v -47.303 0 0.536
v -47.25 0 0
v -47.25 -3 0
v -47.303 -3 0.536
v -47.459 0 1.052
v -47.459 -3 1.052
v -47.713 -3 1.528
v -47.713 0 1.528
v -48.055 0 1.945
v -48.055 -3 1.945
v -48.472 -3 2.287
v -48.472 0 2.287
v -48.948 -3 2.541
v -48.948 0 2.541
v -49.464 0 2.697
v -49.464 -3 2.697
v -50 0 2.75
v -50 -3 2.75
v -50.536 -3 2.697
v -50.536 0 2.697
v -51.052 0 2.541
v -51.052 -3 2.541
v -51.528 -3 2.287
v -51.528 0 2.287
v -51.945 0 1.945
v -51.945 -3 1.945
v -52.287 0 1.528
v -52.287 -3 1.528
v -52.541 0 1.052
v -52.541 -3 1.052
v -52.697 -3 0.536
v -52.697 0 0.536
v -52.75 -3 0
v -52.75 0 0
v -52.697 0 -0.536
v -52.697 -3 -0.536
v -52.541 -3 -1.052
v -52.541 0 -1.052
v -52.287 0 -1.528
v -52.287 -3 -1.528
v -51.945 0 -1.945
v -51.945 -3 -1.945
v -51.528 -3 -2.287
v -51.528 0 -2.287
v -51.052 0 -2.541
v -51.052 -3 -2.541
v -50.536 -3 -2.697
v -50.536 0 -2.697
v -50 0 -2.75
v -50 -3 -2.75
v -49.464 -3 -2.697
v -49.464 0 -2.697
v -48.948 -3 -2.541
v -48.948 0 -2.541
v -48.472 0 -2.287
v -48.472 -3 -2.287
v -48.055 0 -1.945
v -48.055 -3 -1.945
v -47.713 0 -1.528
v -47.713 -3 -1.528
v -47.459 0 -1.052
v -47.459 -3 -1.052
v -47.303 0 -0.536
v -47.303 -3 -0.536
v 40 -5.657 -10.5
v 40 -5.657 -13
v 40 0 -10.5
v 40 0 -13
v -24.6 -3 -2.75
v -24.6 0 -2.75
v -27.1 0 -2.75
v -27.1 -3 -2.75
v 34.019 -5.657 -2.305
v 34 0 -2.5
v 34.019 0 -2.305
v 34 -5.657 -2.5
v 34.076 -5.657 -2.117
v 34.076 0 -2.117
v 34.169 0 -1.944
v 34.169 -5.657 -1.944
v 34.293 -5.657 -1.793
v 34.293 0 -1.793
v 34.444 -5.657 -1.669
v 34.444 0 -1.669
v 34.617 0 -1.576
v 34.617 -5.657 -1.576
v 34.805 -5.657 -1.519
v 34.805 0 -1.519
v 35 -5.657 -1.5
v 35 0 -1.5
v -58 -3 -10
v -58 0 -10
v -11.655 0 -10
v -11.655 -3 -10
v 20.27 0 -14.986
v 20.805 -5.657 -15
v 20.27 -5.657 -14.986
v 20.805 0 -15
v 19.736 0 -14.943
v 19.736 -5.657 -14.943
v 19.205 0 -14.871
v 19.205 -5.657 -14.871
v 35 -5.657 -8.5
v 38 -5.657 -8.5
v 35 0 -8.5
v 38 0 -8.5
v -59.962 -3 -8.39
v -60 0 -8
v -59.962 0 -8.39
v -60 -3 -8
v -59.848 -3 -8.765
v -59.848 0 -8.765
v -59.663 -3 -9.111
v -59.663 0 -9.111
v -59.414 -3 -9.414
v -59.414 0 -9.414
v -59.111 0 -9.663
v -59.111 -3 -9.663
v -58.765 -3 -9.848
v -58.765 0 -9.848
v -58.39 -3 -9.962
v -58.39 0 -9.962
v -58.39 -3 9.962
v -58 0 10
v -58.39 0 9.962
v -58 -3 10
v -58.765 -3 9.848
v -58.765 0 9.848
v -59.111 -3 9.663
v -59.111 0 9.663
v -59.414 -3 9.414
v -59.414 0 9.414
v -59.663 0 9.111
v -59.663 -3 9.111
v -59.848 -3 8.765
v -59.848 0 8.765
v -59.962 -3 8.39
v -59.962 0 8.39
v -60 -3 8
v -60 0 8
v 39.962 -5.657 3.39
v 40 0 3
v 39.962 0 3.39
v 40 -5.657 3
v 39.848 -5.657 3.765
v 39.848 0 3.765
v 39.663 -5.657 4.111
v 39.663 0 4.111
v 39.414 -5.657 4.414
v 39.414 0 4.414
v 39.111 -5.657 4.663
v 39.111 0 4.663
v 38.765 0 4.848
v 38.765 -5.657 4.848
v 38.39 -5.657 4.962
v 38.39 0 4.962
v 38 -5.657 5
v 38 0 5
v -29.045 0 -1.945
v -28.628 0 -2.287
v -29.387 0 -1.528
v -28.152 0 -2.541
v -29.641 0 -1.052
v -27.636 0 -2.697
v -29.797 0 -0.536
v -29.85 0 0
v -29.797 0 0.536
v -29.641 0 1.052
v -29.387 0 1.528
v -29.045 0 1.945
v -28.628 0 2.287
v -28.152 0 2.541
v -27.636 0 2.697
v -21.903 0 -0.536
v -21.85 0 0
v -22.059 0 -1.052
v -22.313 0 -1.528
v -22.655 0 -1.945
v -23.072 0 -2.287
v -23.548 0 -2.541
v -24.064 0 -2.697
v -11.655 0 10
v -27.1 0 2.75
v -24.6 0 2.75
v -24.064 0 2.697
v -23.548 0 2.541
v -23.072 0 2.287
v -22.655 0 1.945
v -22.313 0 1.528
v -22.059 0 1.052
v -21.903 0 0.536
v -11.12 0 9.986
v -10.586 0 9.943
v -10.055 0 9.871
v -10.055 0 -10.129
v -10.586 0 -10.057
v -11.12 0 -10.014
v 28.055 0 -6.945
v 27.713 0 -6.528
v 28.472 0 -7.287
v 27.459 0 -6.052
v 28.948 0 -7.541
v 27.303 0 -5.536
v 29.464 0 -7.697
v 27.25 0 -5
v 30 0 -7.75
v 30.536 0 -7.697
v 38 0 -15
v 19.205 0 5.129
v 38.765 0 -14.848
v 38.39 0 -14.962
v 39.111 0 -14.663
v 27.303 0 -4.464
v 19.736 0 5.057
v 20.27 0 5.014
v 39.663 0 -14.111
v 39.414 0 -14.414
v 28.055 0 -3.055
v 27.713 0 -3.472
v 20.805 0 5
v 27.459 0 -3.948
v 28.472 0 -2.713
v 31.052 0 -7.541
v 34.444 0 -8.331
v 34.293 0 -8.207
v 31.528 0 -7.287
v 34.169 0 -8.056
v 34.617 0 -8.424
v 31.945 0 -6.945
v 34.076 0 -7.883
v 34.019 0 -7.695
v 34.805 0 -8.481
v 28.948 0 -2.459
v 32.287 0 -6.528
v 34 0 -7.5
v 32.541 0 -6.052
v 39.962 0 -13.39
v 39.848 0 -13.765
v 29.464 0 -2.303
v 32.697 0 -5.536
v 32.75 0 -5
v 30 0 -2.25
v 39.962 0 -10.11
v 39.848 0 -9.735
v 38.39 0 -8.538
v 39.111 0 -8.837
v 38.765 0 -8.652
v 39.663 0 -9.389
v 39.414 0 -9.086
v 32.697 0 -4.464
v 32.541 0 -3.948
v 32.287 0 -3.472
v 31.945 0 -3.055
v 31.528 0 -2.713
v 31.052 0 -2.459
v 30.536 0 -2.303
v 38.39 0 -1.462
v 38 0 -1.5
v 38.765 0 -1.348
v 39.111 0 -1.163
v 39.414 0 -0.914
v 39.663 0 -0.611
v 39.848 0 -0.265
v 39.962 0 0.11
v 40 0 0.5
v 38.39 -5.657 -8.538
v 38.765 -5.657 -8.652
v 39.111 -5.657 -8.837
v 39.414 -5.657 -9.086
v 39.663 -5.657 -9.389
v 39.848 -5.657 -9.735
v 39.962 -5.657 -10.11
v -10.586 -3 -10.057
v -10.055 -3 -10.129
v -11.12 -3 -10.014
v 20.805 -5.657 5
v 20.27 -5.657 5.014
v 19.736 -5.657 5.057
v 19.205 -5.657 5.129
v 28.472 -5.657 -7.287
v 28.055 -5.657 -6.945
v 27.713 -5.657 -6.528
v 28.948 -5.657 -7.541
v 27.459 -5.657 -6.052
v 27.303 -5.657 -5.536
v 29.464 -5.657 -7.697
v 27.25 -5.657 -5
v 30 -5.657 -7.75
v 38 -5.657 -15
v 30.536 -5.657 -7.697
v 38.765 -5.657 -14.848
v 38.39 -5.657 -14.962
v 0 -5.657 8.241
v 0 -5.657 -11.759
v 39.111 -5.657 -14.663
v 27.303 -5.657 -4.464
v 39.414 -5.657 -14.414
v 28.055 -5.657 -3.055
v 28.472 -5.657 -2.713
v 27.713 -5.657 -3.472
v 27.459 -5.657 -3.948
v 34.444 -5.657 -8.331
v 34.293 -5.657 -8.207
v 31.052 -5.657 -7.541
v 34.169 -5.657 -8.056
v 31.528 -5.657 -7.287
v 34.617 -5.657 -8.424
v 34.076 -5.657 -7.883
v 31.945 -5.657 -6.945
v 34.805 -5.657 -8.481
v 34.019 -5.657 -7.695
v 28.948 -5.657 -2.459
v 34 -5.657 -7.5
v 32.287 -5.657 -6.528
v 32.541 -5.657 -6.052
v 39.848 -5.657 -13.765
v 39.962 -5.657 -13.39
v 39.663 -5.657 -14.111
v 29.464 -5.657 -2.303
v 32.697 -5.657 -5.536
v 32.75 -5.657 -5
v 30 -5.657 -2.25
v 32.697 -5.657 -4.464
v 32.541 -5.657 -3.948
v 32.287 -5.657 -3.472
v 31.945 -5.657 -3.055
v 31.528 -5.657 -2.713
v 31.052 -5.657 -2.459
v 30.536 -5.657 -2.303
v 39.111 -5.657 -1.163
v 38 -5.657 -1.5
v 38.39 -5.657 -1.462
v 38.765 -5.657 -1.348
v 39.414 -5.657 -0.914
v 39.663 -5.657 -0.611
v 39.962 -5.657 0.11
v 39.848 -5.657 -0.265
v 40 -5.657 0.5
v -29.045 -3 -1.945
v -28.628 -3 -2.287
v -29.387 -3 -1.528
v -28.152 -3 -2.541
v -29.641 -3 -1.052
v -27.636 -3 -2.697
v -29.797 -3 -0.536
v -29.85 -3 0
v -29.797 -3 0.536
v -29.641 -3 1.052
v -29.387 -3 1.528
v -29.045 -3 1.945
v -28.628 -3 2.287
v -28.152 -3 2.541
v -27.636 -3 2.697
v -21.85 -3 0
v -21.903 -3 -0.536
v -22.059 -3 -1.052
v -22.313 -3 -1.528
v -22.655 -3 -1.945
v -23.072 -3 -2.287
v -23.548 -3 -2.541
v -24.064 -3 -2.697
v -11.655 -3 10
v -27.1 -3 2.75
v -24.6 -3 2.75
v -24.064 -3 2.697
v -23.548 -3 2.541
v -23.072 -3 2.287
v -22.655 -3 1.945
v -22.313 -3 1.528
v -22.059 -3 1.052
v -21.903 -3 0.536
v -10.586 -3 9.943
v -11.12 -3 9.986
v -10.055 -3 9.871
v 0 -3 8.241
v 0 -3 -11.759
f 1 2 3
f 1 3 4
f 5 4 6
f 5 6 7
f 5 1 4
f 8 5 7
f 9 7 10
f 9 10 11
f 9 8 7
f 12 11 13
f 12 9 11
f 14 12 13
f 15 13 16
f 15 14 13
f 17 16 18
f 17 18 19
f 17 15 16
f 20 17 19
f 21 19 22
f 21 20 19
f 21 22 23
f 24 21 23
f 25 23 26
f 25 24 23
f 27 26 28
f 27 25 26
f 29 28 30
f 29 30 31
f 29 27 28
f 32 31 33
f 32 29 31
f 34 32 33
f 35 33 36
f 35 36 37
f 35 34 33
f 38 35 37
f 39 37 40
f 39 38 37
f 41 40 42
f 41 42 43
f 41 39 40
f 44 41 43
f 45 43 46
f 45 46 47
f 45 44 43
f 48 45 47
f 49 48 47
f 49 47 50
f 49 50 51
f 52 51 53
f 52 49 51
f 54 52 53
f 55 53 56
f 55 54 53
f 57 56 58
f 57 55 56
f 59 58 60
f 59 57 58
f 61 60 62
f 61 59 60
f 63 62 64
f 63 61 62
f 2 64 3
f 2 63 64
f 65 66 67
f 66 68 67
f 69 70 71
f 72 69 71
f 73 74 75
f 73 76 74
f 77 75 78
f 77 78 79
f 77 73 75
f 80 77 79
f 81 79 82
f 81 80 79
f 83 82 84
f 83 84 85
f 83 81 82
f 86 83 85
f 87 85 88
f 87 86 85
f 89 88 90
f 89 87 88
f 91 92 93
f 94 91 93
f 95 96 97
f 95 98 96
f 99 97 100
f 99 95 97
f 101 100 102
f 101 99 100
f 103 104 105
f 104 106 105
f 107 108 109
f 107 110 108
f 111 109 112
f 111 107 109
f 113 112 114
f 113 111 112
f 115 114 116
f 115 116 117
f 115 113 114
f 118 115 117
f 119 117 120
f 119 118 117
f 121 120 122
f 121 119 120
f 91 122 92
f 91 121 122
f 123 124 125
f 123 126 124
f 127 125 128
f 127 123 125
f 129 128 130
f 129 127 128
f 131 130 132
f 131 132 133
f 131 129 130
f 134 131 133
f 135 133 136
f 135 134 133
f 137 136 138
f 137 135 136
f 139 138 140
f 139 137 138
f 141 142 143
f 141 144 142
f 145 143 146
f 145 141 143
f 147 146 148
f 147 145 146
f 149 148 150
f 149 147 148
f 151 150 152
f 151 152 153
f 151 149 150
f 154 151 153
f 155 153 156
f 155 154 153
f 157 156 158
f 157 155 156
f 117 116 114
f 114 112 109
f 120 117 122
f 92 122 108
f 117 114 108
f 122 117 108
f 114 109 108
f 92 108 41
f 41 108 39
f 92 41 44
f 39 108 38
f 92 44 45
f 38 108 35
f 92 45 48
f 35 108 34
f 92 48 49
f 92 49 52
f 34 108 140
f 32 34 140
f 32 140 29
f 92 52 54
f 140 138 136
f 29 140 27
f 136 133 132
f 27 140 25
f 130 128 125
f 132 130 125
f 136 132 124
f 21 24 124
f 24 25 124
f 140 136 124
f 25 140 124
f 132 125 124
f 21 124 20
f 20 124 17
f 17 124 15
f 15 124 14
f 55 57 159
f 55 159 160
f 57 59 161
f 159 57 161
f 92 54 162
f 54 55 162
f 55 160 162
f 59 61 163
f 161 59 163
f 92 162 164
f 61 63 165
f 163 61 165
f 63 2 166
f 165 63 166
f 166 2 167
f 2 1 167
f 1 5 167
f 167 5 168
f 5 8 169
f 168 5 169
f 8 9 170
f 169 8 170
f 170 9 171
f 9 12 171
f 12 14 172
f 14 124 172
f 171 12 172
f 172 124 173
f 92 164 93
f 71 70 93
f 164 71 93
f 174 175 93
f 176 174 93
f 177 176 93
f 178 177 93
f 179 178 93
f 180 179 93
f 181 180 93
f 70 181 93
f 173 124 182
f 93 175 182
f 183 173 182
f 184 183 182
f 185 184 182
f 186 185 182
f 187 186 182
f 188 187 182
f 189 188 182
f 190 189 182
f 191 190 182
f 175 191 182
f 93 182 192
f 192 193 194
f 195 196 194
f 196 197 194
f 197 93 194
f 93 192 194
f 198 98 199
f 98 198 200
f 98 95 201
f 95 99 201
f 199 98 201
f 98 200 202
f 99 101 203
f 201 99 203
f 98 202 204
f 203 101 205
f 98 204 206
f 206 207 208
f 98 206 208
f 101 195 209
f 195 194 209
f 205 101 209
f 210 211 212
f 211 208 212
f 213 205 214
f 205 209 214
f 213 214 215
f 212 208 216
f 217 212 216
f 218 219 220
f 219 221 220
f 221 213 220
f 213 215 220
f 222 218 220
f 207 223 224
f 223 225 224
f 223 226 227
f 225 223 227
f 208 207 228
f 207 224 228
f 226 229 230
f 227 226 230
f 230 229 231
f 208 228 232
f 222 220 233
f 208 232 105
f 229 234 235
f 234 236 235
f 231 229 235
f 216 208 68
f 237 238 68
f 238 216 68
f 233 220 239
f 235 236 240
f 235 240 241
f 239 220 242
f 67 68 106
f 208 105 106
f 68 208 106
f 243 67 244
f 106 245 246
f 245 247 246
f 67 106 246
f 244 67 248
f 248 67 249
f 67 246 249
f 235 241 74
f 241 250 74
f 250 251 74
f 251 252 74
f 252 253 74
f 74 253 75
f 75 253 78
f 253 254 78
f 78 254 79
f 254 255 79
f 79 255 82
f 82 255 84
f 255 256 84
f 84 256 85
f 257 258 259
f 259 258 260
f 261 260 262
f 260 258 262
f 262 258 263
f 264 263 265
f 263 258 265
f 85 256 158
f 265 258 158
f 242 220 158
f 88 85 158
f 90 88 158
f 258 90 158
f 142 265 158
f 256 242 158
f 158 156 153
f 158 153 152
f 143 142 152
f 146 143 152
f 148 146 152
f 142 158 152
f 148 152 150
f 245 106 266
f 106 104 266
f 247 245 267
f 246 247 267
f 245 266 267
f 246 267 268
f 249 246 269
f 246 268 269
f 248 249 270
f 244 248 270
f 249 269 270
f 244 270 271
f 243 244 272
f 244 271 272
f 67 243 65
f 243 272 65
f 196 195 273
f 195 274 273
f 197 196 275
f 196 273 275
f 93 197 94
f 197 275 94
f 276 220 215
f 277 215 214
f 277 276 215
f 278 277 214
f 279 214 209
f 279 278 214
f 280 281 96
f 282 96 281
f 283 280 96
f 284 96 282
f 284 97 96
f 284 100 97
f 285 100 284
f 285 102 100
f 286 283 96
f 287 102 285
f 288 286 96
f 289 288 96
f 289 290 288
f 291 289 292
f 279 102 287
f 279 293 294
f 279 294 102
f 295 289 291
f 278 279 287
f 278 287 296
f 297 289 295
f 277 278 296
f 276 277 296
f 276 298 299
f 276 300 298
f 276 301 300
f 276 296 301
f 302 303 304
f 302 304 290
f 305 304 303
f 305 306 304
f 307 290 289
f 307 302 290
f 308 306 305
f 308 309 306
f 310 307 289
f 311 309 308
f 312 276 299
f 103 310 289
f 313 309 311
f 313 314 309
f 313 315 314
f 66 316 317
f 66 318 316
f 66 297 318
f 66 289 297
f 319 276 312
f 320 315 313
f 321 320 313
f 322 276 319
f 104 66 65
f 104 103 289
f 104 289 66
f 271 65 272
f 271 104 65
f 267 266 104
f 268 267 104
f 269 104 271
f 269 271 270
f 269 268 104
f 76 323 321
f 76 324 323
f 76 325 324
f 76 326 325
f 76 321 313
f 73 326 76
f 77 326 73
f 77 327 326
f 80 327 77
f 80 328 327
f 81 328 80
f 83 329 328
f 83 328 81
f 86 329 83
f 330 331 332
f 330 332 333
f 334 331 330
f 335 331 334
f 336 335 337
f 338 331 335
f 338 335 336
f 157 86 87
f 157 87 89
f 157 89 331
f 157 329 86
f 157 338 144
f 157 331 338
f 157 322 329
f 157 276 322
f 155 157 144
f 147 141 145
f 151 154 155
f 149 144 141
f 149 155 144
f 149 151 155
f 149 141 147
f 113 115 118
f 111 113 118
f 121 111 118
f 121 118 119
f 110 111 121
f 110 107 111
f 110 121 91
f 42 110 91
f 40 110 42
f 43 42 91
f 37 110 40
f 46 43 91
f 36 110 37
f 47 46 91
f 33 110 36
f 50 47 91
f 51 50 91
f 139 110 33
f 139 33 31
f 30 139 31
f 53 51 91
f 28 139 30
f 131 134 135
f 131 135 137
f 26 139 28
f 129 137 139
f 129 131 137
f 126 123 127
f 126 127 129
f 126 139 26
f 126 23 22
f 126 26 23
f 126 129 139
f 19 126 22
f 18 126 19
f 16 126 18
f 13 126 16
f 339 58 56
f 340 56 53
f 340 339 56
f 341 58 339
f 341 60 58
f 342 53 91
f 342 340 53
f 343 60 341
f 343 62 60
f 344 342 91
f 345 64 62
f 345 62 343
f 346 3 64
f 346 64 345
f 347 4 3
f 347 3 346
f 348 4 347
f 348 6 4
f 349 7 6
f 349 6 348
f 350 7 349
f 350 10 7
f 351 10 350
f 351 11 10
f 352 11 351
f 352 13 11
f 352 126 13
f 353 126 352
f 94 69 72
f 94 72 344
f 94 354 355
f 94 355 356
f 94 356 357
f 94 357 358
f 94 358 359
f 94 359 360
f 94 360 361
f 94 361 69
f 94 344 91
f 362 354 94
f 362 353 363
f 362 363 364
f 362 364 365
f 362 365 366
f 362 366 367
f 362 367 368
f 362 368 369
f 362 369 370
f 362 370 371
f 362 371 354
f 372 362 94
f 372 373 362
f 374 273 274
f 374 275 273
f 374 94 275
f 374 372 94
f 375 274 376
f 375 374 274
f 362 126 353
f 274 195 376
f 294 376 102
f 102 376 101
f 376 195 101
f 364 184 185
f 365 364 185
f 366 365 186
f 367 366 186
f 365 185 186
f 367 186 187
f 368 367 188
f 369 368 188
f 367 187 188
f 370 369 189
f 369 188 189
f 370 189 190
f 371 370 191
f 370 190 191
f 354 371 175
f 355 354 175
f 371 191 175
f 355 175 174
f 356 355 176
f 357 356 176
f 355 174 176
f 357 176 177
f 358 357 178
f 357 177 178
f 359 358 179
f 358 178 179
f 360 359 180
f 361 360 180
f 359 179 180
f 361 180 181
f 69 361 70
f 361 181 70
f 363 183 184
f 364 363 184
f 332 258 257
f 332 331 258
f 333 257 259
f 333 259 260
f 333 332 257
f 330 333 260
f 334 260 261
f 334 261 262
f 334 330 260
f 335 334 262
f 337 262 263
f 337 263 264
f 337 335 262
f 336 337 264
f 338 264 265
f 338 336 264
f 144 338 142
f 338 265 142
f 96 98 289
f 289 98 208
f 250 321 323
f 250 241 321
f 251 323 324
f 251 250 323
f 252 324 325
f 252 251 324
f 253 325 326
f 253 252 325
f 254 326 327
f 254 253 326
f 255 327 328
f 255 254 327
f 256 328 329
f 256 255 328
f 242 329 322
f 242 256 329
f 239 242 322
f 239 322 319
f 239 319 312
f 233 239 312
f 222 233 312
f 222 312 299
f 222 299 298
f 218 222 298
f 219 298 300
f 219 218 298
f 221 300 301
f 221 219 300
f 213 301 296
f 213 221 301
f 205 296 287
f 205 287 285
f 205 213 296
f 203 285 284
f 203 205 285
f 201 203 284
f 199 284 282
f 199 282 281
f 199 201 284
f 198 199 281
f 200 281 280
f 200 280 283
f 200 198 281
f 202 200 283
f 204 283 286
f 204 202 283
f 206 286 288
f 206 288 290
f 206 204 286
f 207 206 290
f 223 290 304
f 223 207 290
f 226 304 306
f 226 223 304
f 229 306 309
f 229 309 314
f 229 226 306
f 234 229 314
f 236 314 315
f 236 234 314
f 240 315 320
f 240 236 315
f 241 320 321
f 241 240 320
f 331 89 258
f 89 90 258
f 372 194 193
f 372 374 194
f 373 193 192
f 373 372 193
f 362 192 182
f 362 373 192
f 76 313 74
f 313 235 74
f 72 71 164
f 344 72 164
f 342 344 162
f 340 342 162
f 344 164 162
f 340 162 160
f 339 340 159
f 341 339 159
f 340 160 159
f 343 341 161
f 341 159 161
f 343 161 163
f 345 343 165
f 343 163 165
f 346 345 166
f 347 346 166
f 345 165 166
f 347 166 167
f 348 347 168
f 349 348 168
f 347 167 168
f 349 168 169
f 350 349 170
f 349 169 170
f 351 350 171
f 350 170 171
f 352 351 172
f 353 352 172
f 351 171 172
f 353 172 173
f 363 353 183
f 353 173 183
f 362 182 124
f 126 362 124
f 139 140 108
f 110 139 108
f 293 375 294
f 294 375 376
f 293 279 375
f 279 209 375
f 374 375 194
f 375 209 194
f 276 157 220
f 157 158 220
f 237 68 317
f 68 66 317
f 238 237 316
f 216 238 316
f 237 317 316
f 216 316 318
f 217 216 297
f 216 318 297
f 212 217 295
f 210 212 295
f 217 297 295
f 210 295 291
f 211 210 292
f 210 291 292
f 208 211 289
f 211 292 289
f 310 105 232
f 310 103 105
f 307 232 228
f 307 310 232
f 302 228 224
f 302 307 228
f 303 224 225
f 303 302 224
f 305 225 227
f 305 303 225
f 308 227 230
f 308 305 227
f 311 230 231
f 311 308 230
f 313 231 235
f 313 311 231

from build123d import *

# Parameters (mm, degrees)
F0_R     = 2.75
F1_DEPTH = 3
F2_R     = 2.75
F3_DEPTH = 2.65684
F4_R     = 1
F5_R     = 2
F6_R     = 10


with BuildPart() as f1:
    # F0 (on Front) → F1 (new body)
    with BuildSketch(Plane.XZ):
        Polygon((-10.85, 10), (-60, 10), (-60, -10), (-10.85, -10), (0, -11.7585089141), (0, 8.2414910859), align=None)
        with Locations((-50, 0)):
            Circle(F0_R, mode=Mode.SUBTRACT)
        with BuildLine():
            ThreePointArc((-27.1, -2.75), (-29.85, 0), (-27.1, 2.75))
            Line((-27.1, 2.75), (-24.6, 2.75))
            ThreePointArc((-24.6, 2.75), (-21.85, 0), (-24.6, -2.75))
            Line((-24.6, -2.75), (-27.1, -2.75))
        make_face(mode=Mode.SUBTRACT)
        Polygon((20, 5), (0, 8.2414910859), (0, -11.7585089141), (20, -15), (40, -15), (40, -8.5), (34, -8.5), (34, -1.5), (40, -1.5), (40, 5), align=None)
        with Locations((30, -5)):
            Circle(F0_R, mode=Mode.SUBTRACT)
    extrude(amount=F1_DEPTH)

    # F2 (on face) → F3 (join)
    with BuildSketch(Plane.XZ.offset(3)):
        Polygon((20, -15), (40, -15), (40, -8.5), (34, -8.5), (34, -1.5), (40, -1.5), (40, 5), (20, 5), align=None)
        with Locations((30, -5)):
            Circle(F2_R, mode=Mode.SUBTRACT)
        Polygon((0, -11.7585089141), (20, -15), (20, 5), (0, 8.2414910859), align=None)
    extrude(amount=F3_DEPTH)

    # F4
    f4_edges = [f1.edges().sort_by_distance(p)[0] for p in [
        (34, -2.82842, -1.5),
        (34, -2.82842, -8.5),
    ]]
    fillet(f4_edges, radius=F4_R)

    # F5
    f5_edges = [f1.edges().sort_by_distance(p)[0] for p in [
        (40, -2.82842, 5),
        (40, -2.82842, -8.5),
        (40, -2.82842, -1.5),
        (40, -2.82842, -15),
        (-60, -1.5, 10),
        (-60, -1.5, -10),
    ]]
    fillet(f5_edges, radius=F5_R)

    # F6
    f6_edges = [f1.edges().sort_by_distance(p)[0] for p in [
        (-10.85, -1.5, 10),
        (20, -2.82842, 5),
        (-10.85, -1.5, -10),
        (20, -2.82842, -15),
    ]]
    fillet(f6_edges, radius=F6_R)


solid = f1.part
